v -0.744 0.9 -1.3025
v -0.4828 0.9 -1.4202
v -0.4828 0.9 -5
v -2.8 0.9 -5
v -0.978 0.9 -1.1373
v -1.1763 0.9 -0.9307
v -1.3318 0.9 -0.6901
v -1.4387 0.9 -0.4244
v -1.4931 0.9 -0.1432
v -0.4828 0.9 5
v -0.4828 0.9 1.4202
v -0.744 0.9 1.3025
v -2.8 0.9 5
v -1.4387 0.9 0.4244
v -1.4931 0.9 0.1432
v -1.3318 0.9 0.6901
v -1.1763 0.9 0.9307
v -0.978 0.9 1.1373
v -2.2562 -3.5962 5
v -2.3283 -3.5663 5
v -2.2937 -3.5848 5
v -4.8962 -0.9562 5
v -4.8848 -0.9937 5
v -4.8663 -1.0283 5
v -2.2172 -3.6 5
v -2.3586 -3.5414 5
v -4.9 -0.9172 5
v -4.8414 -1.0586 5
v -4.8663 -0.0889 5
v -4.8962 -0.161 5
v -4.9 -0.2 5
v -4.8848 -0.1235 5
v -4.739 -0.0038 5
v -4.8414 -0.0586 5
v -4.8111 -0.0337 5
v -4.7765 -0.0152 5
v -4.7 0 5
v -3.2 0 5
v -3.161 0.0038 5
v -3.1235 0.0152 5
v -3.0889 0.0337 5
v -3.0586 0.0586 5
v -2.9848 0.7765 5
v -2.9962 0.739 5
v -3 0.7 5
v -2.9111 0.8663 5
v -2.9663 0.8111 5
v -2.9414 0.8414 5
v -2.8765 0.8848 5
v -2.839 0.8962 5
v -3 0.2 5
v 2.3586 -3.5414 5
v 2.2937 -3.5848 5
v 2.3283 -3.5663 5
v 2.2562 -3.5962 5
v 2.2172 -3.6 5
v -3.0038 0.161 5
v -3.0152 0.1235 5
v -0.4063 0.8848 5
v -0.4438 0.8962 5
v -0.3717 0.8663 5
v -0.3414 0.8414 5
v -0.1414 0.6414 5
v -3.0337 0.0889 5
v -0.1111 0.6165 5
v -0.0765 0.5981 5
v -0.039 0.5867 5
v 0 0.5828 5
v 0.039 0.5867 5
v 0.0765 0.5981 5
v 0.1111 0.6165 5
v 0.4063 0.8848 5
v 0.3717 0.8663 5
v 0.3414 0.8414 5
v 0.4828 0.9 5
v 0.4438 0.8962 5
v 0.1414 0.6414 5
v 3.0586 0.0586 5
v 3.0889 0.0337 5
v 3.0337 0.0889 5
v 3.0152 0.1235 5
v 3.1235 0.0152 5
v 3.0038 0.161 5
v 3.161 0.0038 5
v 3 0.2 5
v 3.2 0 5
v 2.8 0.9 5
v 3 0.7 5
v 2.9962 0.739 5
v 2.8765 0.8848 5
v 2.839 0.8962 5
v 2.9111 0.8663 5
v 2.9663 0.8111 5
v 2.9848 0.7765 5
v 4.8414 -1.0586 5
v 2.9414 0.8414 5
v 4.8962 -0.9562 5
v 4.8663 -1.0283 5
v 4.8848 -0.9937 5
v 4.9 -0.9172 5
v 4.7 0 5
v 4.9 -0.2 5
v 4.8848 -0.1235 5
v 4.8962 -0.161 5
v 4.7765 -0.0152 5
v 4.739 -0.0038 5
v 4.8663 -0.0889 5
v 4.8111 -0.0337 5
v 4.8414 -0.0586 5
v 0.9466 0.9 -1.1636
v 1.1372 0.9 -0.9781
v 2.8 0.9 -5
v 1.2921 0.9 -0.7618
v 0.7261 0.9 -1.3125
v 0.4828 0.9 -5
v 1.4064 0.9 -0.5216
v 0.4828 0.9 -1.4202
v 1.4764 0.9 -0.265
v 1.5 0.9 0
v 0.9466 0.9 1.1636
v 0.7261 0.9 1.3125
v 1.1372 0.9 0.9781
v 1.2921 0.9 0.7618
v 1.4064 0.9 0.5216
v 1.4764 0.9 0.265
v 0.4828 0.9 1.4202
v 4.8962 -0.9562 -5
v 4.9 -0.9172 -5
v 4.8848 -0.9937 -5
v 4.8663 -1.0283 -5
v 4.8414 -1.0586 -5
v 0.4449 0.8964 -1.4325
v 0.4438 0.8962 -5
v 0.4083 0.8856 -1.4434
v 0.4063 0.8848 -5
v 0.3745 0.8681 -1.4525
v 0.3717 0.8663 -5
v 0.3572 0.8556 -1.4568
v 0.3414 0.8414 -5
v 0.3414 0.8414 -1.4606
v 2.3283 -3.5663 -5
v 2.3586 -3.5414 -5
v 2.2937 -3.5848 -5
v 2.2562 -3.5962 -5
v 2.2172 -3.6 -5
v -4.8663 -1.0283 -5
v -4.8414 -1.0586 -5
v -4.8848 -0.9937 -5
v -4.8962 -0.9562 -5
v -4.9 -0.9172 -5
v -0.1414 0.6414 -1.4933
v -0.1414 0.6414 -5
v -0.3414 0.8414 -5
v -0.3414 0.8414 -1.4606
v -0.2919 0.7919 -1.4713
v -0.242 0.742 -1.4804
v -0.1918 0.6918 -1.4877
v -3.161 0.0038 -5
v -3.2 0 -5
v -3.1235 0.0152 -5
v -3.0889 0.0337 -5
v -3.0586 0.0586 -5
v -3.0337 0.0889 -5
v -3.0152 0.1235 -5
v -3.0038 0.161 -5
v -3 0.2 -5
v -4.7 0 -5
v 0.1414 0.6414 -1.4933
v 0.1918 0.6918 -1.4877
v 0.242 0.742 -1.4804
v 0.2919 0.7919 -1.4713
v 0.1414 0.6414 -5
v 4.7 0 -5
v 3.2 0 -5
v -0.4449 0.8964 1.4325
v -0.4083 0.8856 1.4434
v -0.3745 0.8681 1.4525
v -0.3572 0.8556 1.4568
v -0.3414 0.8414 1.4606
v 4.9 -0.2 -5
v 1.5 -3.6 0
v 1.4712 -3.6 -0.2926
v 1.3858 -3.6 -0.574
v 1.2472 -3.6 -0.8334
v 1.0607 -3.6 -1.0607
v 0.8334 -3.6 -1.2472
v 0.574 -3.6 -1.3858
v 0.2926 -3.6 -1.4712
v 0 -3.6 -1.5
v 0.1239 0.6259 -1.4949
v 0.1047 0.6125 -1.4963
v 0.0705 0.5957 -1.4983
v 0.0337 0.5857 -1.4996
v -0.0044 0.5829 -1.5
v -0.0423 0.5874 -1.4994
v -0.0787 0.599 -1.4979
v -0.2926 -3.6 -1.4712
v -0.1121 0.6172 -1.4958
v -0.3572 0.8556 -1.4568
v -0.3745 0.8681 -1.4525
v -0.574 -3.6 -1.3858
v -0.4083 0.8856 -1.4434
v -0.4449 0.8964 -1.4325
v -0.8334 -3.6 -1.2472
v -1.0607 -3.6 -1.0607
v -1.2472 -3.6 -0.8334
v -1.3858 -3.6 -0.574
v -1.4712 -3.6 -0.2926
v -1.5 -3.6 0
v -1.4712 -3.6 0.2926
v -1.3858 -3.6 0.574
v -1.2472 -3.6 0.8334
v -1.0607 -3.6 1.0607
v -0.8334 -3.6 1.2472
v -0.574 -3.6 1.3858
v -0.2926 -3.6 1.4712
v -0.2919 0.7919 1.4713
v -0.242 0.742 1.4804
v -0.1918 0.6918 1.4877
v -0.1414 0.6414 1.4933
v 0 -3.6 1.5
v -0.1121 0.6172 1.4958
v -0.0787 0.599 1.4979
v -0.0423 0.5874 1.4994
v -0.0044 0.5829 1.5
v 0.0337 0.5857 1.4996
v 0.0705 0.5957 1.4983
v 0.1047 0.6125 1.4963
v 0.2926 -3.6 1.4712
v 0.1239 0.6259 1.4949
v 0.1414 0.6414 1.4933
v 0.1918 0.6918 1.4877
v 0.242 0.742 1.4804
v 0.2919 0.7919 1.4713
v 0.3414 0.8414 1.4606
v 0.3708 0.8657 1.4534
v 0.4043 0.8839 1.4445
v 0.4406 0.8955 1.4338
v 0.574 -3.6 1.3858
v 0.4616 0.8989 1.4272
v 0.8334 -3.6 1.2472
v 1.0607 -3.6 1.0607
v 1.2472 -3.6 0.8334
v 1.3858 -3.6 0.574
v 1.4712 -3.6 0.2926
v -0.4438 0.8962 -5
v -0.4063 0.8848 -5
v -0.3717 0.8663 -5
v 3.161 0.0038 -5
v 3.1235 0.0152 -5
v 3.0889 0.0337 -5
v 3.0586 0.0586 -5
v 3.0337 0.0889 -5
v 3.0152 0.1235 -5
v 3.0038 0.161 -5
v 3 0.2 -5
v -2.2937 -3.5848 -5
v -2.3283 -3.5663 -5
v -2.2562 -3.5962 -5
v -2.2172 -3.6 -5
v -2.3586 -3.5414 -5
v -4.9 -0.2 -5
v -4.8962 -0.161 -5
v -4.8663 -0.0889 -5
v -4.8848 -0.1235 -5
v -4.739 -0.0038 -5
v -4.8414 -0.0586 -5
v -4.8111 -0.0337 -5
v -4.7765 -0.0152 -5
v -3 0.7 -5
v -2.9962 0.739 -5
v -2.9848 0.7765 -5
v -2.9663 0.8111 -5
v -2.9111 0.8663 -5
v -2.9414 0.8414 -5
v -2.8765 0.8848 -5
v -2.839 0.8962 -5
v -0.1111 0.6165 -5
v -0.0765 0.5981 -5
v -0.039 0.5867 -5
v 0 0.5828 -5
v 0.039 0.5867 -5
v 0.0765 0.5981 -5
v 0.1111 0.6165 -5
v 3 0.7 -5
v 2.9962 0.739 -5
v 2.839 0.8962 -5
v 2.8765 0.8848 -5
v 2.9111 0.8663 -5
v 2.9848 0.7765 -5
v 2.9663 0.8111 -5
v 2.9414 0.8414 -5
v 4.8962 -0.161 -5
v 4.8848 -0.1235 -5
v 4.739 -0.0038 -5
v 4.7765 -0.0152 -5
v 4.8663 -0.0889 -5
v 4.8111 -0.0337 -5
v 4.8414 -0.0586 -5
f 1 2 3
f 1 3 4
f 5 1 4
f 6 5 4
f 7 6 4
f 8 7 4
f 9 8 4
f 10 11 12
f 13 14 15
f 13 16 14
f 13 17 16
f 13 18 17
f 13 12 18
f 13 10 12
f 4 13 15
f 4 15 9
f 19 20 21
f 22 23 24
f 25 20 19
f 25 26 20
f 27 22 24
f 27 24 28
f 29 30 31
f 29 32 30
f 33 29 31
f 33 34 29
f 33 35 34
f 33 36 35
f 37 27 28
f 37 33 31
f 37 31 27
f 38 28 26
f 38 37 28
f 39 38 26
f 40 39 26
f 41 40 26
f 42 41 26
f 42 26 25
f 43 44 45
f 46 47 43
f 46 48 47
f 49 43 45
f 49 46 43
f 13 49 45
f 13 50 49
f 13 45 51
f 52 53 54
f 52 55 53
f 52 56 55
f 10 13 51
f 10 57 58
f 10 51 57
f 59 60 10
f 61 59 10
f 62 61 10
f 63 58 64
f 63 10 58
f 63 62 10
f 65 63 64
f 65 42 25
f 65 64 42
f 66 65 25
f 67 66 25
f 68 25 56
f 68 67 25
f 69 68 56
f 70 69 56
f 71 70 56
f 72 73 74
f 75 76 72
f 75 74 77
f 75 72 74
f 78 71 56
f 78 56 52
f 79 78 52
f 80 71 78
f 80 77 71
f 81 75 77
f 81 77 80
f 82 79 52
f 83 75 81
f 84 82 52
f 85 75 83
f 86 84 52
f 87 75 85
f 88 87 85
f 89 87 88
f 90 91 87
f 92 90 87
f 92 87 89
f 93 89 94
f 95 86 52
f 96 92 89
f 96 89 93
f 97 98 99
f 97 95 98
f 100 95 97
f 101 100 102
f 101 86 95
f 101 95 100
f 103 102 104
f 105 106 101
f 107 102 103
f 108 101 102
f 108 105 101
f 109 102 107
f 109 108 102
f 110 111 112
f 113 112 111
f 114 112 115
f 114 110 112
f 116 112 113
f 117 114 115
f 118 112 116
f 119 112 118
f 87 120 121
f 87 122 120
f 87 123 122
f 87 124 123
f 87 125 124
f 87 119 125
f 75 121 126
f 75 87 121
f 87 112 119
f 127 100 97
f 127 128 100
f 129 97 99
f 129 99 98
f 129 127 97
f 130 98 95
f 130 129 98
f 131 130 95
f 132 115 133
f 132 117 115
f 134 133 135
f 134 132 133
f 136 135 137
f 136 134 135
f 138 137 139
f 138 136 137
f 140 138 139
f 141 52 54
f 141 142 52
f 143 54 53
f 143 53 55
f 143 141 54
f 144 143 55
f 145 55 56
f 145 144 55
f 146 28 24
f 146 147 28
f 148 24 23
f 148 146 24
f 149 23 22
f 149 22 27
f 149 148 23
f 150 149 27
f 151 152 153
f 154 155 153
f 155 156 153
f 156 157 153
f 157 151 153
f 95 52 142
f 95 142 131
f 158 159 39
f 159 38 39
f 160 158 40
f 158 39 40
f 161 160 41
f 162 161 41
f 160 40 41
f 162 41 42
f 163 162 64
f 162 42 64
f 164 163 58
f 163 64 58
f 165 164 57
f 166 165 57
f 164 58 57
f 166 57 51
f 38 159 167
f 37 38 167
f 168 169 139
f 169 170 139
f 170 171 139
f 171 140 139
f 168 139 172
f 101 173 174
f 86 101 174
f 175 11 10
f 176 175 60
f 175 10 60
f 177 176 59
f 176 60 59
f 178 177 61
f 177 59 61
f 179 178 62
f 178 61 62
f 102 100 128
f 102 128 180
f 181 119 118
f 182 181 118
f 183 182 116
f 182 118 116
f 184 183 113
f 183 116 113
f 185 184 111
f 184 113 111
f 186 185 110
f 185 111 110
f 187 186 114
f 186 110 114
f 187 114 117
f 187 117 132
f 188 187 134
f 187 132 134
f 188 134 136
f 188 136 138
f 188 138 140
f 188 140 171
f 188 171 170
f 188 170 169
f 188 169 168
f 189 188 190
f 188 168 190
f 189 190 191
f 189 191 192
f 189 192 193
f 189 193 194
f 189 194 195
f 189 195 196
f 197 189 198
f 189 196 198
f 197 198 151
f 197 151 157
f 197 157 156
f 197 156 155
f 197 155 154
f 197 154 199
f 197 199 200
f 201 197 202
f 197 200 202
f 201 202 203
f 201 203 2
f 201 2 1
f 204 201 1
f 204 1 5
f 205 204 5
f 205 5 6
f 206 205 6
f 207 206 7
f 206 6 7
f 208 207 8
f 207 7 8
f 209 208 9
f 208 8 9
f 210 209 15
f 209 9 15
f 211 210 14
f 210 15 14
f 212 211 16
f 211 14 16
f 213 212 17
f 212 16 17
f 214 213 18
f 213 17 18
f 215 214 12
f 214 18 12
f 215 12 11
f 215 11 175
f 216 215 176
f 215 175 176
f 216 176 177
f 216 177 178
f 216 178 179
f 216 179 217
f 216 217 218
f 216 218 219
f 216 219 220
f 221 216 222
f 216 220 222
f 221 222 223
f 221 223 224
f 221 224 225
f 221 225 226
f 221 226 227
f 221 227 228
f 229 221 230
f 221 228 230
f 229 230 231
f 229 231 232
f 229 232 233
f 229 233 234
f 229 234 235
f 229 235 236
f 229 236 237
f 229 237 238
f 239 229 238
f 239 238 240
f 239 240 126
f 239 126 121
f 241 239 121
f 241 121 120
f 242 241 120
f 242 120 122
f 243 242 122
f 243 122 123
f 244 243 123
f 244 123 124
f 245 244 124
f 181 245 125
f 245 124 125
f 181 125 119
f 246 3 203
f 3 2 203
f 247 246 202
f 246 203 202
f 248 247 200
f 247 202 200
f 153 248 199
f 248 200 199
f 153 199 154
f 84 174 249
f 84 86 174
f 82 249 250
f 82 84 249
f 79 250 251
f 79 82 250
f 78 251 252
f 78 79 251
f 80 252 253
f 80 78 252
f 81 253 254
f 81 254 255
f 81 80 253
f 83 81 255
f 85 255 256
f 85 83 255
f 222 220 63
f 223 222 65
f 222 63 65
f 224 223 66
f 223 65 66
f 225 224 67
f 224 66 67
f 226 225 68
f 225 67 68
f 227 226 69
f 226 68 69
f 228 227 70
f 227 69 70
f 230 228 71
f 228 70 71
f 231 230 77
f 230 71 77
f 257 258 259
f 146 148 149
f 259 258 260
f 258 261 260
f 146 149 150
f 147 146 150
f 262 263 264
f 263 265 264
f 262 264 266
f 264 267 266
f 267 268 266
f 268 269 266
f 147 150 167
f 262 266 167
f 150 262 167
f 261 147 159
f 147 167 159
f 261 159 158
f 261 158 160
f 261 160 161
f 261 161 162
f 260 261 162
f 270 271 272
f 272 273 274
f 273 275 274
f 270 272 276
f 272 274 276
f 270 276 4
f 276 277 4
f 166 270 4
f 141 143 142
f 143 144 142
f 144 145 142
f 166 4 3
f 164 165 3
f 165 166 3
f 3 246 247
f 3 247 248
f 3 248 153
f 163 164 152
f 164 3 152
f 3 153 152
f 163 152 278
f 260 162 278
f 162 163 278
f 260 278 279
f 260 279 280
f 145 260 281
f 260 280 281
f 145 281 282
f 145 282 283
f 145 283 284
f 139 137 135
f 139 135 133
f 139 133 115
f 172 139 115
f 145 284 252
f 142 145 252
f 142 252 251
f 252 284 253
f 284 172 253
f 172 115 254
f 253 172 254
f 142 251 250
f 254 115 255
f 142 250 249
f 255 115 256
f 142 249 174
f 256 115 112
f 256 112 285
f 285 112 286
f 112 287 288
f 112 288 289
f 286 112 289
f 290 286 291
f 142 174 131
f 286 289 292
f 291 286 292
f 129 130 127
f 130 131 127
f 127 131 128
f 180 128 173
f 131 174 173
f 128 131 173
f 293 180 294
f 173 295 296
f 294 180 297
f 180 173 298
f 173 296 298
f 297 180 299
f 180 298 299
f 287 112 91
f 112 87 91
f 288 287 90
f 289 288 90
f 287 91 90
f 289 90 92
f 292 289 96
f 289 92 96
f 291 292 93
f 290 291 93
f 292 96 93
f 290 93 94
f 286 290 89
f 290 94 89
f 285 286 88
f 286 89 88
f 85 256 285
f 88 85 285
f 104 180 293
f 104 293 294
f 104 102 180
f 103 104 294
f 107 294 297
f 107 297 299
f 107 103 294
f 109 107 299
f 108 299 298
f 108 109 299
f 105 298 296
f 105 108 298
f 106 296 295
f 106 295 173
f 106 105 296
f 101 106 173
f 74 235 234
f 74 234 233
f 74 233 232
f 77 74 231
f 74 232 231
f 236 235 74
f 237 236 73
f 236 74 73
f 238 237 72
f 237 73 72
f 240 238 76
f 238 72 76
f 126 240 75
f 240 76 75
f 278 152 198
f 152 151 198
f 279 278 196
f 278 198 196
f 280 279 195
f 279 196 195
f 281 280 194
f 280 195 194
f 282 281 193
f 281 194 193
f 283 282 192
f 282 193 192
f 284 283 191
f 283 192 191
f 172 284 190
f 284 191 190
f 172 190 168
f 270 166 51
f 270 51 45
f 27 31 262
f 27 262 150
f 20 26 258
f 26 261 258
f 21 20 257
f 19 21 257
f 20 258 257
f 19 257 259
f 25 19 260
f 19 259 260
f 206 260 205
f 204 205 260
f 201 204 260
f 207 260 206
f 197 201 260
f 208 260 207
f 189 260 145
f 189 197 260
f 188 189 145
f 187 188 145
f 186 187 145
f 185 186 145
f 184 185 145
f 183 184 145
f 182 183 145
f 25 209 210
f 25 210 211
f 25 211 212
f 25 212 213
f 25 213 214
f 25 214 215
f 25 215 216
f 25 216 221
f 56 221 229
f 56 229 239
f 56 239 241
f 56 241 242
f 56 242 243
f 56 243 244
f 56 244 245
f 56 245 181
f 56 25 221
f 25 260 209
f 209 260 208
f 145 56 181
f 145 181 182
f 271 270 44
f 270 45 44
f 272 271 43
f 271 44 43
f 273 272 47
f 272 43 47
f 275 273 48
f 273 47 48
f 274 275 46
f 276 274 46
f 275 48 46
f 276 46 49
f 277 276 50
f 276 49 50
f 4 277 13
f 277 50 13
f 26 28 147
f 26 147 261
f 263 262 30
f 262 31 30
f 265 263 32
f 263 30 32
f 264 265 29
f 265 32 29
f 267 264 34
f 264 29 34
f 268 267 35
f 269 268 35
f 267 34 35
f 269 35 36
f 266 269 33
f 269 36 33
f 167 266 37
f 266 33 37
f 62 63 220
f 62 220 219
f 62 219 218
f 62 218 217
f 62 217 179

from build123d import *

# Parameters (mm, degrees)
EXTRUDE_BODY_DEPTH = 10
SKETCH2_W          = 1.9
SKETCH2_H          = 0.9
CUT_EXTRUDE1_DEPTH = 11
SKETCH3_W          = 1.9
SKETCH3_H          = 0.9
CUT_EXTRUDE2_DEPTH = 11
CUT_EXTRUDE3_DEPTH = 11
HOLE_REVOLVE_D     = 3
EDGE_FILLETS_R     = 0.2


with BuildPart() as part:
    # Sketch1 → Extrude Body (new body)
    with BuildSketch(Plane.XY.offset(5)):
        Polygon((4.9, -1), (4.9, 0.9), (-4.9, 0.9), (-4.9, -1), (-2.3, -3.6), (2.3, -3.6), align=None)
    extrude(amount=-EXTRUDE_BODY_DEPTH)

    # Sketch2 → Cut-Extrude1 (cut, through all)
    with BuildSketch(Plane(origin=(0, 0, -5), x_dir=(-1, 0, 0), z_dir=(0, 0, -1))):
        with Locations((3.95, 0.45)):
            Rectangle(SKETCH2_W, SKETCH2_H)
    extrude(amount=-CUT_EXTRUDE1_DEPTH, mode=Mode.SUBTRACT)

    # Sketch3 → Cut-Extrude2 (cut, through all)
    with BuildSketch(Plane(origin=(0, 0, -5), x_dir=(-1, 0, 0), z_dir=(0, 0, -1))):
        with Locations((-3.95, 0.45)):
            Rectangle(SKETCH3_W, SKETCH3_H)
    extrude(amount=-CUT_EXTRUDE2_DEPTH, mode=Mode.SUBTRACT)

    # Sketch4 → Cut-Extrude3 (cut, through all)
    with BuildSketch(Plane(origin=(0, 0, -5), x_dir=(-1, 0, 0), z_dir=(0, 0, -1))):
        Polygon((0.4, 0.9), (-0.4, 0.9), (0, 0.5), align=None)
    extrude(amount=-CUT_EXTRUDE3_DEPTH, mode=Mode.SUBTRACT)

    # Hole Revolve (through all)
    with Locations(Plane(origin=(0, -3.6, 0), x_dir=(-1, 0, 0), z_dir=(0, -1, 0))):
        with Locations((0, 0)):
            Hole(HOLE_REVOLVE_D / 2)

    # Edge Fillets
    edge_fillets_edges = [part.edges().sort_by_distance(p)[0] for p in [
        (4.9, 0, 0),
        (3, 0, 0),
        (-4.9, -1, 0),
        (3, 0.9, 0),
        (-3, 0, 0),
        (0.4, 0.9, -3.222841615),
        (0, 0.5, 3.25),
        (-0.4, 0.9, -3.222841615),
        (4.9, -1, 0),
        (-3, 0.9, 0),
        (0, 0.5, -3.25),
        (-0.4, 0.9, 3.222841615),
        (-4.9, 0, 0),
        (-2.3, -3.6, 0),
        (0.4, 0.9, 3.222841615),
        (2.3, -3.6, 0),
    ]]
    fillet(edge_fillets_edges, radius=EDGE_FILLETS_R)


solid = part.part
